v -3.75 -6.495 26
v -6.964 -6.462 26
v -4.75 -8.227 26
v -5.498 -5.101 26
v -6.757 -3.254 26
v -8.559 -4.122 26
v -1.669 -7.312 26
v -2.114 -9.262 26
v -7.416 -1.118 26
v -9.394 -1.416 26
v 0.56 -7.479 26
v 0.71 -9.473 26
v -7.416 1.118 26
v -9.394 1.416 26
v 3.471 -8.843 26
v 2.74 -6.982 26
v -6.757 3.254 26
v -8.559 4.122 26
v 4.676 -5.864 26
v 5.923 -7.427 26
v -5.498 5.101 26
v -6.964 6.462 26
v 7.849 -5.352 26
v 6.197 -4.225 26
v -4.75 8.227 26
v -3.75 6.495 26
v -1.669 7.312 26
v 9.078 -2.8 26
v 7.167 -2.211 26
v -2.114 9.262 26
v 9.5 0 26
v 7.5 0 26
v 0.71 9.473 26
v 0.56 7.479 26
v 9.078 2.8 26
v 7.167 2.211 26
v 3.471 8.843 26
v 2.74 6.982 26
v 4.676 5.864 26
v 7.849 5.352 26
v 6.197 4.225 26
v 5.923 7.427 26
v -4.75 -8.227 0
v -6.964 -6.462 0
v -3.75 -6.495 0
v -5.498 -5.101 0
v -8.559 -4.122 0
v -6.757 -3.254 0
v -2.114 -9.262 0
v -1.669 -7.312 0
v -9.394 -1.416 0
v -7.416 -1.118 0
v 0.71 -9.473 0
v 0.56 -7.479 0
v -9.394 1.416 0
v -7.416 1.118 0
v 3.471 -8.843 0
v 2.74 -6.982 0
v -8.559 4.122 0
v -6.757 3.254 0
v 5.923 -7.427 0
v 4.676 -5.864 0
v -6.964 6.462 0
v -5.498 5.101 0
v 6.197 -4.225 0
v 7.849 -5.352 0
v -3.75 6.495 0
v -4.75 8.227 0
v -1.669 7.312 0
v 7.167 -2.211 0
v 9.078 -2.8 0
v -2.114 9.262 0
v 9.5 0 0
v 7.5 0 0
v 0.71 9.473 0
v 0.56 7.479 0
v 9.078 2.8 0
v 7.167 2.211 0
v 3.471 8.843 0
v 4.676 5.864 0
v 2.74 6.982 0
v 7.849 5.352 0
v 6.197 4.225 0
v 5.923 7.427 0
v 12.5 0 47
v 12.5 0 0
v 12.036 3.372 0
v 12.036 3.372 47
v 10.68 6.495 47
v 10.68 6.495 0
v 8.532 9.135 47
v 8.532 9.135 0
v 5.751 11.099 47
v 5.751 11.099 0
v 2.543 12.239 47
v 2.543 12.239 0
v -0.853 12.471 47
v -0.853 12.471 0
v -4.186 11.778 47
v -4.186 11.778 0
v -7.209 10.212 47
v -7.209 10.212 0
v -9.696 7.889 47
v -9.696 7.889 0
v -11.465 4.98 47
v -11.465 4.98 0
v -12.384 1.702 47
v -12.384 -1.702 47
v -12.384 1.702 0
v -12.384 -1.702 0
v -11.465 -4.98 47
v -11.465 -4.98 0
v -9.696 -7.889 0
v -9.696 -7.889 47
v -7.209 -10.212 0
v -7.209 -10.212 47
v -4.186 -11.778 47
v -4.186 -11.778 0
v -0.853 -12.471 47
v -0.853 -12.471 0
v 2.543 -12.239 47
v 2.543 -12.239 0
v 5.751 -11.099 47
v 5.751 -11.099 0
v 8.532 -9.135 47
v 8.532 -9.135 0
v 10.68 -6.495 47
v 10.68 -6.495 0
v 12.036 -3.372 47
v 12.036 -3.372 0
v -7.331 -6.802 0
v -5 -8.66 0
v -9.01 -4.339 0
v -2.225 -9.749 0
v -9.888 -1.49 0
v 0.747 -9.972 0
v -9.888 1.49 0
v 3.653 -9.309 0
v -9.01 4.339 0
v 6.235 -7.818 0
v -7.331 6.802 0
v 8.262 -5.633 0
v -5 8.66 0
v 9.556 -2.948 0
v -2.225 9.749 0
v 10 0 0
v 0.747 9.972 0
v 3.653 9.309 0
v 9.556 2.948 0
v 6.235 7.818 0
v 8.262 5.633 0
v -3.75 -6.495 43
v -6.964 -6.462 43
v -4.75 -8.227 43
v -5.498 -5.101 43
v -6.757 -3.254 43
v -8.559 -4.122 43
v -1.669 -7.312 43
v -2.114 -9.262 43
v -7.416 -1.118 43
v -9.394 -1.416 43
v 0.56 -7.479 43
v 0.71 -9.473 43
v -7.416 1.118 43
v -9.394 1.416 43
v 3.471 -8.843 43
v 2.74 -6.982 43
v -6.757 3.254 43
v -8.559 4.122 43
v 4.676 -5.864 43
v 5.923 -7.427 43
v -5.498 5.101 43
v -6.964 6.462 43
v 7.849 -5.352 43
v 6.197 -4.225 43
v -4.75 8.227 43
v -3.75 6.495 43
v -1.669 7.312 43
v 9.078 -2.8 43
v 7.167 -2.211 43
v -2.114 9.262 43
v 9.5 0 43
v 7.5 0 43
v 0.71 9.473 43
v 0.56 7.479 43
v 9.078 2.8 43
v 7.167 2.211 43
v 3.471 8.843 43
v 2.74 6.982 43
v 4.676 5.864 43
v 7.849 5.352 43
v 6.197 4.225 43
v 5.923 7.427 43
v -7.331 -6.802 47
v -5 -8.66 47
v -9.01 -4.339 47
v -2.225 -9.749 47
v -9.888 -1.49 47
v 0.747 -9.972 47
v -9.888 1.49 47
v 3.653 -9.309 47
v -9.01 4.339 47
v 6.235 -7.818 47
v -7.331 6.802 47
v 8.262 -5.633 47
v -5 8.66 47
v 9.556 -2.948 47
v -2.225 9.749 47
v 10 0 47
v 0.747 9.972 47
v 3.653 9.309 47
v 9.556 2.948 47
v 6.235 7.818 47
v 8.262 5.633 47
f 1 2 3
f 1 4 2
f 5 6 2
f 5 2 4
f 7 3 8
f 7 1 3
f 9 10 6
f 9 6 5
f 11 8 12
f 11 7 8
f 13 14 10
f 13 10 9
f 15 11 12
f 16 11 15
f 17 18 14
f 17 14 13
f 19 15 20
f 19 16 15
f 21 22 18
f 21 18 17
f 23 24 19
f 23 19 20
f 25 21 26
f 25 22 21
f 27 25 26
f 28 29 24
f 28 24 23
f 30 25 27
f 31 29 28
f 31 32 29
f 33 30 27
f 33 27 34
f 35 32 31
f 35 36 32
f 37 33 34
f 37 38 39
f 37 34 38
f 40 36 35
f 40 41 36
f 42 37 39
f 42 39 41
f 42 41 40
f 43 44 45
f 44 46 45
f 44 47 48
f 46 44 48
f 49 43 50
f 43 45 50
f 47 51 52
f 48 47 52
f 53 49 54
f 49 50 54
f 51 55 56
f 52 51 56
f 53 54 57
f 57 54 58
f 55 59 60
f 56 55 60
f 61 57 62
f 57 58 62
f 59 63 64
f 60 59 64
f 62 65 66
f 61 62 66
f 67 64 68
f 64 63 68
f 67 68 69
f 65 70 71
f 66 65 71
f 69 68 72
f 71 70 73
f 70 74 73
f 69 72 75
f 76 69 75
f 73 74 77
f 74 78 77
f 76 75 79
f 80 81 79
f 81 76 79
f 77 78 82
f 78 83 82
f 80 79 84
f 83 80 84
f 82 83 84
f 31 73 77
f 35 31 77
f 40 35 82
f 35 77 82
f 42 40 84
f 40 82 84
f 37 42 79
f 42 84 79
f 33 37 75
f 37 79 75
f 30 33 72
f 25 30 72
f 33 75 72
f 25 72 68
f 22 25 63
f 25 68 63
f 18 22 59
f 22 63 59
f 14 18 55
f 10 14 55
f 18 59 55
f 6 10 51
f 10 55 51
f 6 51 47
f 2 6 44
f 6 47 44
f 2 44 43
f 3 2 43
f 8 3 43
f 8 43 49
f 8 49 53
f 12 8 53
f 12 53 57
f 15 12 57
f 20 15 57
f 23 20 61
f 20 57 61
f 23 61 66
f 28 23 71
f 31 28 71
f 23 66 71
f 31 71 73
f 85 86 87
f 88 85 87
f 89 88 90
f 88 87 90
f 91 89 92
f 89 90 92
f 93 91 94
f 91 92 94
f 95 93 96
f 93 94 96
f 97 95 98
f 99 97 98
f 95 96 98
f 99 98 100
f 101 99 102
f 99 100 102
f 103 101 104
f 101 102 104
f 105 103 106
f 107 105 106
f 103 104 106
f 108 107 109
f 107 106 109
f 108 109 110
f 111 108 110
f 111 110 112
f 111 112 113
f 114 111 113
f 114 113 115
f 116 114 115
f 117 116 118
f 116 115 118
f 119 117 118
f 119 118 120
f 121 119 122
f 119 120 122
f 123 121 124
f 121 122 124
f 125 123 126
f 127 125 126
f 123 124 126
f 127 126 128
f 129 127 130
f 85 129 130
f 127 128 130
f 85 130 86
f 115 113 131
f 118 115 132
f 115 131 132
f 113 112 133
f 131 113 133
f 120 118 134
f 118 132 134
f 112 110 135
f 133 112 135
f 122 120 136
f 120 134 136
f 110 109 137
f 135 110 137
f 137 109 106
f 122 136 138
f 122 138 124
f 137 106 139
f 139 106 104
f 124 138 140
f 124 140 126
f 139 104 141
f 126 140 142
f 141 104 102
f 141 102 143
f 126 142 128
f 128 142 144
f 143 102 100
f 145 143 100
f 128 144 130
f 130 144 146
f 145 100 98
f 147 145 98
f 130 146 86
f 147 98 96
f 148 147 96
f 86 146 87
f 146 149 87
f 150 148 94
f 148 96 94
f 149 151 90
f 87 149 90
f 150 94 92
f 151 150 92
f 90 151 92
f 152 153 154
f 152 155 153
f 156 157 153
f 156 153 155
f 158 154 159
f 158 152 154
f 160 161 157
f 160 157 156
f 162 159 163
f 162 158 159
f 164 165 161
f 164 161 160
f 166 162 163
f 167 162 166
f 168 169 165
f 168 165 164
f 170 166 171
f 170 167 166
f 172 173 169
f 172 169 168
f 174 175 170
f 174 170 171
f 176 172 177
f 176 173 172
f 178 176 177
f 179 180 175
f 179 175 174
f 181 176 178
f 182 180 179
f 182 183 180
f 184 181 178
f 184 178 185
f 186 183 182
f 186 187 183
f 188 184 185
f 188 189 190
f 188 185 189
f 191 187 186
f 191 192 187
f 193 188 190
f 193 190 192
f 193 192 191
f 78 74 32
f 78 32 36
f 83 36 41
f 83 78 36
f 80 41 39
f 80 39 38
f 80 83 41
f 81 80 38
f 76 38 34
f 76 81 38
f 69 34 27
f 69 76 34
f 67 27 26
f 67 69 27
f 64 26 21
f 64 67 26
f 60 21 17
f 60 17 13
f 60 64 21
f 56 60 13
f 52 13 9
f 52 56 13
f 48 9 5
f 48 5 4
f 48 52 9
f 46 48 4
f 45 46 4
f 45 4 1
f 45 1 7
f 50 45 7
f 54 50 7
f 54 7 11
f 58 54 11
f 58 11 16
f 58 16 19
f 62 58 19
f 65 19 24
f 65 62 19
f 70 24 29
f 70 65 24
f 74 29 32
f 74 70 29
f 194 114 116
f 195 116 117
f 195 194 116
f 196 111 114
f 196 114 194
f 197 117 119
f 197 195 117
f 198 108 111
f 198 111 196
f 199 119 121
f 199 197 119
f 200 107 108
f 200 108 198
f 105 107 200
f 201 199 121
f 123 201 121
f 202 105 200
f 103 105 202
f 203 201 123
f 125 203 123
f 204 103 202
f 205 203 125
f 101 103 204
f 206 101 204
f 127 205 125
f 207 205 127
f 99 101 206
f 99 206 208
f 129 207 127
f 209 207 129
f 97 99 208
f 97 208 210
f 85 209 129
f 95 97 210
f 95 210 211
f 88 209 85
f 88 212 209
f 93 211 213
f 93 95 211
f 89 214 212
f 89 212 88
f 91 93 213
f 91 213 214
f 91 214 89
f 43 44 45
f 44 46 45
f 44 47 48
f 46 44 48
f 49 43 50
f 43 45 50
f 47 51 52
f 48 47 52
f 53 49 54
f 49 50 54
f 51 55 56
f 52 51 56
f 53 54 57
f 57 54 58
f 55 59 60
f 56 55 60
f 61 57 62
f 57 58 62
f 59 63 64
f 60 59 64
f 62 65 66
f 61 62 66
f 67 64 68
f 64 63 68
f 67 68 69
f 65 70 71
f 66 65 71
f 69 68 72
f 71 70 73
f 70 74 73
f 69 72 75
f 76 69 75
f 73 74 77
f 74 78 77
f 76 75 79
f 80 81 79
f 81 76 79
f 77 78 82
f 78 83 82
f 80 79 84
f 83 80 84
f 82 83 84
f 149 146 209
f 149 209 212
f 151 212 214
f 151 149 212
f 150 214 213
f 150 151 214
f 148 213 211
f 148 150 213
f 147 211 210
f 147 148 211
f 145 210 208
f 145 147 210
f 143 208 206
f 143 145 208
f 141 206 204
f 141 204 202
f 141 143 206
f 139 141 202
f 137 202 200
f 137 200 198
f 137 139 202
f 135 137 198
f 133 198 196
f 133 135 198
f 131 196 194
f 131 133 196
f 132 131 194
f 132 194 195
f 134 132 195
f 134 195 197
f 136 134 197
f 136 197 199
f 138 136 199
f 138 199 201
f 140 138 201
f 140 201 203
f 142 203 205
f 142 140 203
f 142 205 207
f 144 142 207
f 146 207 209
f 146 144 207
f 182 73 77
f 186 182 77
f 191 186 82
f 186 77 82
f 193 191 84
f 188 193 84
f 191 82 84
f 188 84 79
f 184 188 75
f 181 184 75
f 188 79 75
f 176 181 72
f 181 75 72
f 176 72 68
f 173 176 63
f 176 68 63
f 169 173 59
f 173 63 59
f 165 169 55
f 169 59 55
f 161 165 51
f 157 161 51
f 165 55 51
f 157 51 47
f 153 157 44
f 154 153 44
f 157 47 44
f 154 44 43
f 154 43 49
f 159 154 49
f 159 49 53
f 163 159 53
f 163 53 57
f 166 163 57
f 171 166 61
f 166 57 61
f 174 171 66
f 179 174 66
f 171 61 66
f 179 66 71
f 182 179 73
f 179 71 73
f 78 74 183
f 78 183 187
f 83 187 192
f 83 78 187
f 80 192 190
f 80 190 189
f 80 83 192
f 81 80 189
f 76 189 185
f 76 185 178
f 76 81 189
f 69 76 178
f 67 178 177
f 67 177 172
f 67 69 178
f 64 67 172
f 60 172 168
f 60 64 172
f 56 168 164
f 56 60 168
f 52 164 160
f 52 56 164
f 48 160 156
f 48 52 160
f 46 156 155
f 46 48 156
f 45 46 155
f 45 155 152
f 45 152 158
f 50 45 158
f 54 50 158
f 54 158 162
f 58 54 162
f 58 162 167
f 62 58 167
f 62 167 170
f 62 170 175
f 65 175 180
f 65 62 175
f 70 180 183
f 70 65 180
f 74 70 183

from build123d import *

# Parameters (mm, degrees)
F0_R      = 12.5
F0_R_2    = 10
F1_DEPTH  = 47
F4_T      = -2
F7_T      = -2
F9_R      = 9.5
F9_R_2    = 7.5
F10_DEPTH = 26
F11_DEPTH = 43


# Not quite as in the source:
# - a shell that OpenCascade refuses in one call is made with other operations: the cavity is built on its own and cut out


with BuildPart() as f1:
    # F0 (on Top) → F1 (new body)
    with BuildSketch(Plane.XY):
        Circle(F0_R)
        Circle(F0_R_2, mode=Mode.SUBTRACT)
    extrude(amount=F1_DEPTH)


with BuildPart() as f3:
    # F2 (on Right) → F3 (revolve)
    with BuildSketch(Plane.YZ):
        with BuildLine():
            Line((-7.5, 6), (-7.5, 0))
            Line((-7.5, 0), (0, 0))
            Line((0, 0), (0, 26))
            Line((0, 26), (-9.5, 26))
            Line((-9.5, 26), (-9.5, 11))
            add(Edge.make_bspline(
                [(-9.5, 11), (-9.4961709784, 9.3502644282), (-8.3647090448, 8.5490267521), (-7.7744109319, 7.5516820676), (-7.5, 6)],
                knots=[0, 0, 0, 0, 0.5, 1, 1, 1, 1], degree=3))
        make_face()
    revolve(axis=Axis((0, 0, 13), (0, 0, 1)))

    # F4
    f4_openings = [f3.faces().sort_by_distance(p)[0] for p in [
        (0, 0, 26),
        (0, 0, 0),
    ]]
    offset(amount=F4_T, openings=f4_openings)

    # F5 (on Right) → F6 (revolve)
    with BuildSketch(Plane.YZ):
        with BuildLine():
            Line((262.8517738675, 184.9563693243), (262.8517738675, 178.9563693243))
            Line((262.8517738675, 178.9563693243), (270.3517738675, 178.9563693243))
            Line((270.3517738675, 178.9563693243), (270.3517738675, 204.9563693243))
            Line((270.3517738675, 204.9563693243), (260.8517738675, 204.9563693243))
            Line((260.8517738675, 204.9563693243), (260.8517738675, 192.9563693243))
            add(Edge.make_bspline(
                [(260.8517738675, 192.9563693243), (261.0294527264, 189.8867335533), (261.6645518108, 189.6724810667), (263.0485391221, 186.5937816102), (262.8517738675, 184.9563693243)],
                knots=[0, 0, 0, 0, 0.5, 1, 1, 1, 1], degree=3))
        make_face()
        with BuildLine():
            Line((-7.5, 8), (-7.5, 0))
            Line((-7.5, 0), (0, 0))
            Line((0, 0), (0, 43))
            Line((0, 43), (-9.5, 43))
            Line((-9.5, 43), (-9.5, 13))
            add(Edge.make_bspline(
                [(-9.5, 13), (-9.4583500177, 11.7673277855), (-8.4318036754, 10.2421248369), (-7.6780426316, 9.7484225407), (-7.5, 8)],
                knots=[0, 0, 0, 0, 0.5, 1, 1, 1, 1], degree=3))
        make_face()
    revolve(axis=Axis((0, 0, 21.5), (0, 0, 1)))

    # F7: a shell. OpenCascade refuses it in one call, so the cavity is built on its own and cut out:
    # the body offset inwards by the wall thickness, plus a prism from it out through each open face.
    f7_core = offset(f3.part, amount=F7_T, mode=Mode.PRIVATE)
    f7_exits = [f7_core.faces().sort_by_distance(p)[0] for p in [
        (0, 0, 41),
        (0, 0, 2),
    ]]
    add(f7_core, mode=Mode.SUBTRACT)
    extrude(f7_exits, amount=-F7_T, mode=Mode.SUBTRACT)


with BuildPart() as f10:
    # F9 (on Top) → F10 (new body)
    with BuildSketch(Plane.XY):
        Circle(F9_R)
        Circle(F9_R_2, mode=Mode.SUBTRACT)
    extrude(amount=F10_DEPTH)


with BuildPart() as f11:
    # F9 (on Top) → F11 (new body)
    with BuildSketch(Plane.XY):
        Circle(F9_R)
        Circle(F9_R_2, mode=Mode.SUBTRACT)
    extrude(amount=F11_DEPTH)


solid = Compound([f1.part, f10.part, f11.part])
